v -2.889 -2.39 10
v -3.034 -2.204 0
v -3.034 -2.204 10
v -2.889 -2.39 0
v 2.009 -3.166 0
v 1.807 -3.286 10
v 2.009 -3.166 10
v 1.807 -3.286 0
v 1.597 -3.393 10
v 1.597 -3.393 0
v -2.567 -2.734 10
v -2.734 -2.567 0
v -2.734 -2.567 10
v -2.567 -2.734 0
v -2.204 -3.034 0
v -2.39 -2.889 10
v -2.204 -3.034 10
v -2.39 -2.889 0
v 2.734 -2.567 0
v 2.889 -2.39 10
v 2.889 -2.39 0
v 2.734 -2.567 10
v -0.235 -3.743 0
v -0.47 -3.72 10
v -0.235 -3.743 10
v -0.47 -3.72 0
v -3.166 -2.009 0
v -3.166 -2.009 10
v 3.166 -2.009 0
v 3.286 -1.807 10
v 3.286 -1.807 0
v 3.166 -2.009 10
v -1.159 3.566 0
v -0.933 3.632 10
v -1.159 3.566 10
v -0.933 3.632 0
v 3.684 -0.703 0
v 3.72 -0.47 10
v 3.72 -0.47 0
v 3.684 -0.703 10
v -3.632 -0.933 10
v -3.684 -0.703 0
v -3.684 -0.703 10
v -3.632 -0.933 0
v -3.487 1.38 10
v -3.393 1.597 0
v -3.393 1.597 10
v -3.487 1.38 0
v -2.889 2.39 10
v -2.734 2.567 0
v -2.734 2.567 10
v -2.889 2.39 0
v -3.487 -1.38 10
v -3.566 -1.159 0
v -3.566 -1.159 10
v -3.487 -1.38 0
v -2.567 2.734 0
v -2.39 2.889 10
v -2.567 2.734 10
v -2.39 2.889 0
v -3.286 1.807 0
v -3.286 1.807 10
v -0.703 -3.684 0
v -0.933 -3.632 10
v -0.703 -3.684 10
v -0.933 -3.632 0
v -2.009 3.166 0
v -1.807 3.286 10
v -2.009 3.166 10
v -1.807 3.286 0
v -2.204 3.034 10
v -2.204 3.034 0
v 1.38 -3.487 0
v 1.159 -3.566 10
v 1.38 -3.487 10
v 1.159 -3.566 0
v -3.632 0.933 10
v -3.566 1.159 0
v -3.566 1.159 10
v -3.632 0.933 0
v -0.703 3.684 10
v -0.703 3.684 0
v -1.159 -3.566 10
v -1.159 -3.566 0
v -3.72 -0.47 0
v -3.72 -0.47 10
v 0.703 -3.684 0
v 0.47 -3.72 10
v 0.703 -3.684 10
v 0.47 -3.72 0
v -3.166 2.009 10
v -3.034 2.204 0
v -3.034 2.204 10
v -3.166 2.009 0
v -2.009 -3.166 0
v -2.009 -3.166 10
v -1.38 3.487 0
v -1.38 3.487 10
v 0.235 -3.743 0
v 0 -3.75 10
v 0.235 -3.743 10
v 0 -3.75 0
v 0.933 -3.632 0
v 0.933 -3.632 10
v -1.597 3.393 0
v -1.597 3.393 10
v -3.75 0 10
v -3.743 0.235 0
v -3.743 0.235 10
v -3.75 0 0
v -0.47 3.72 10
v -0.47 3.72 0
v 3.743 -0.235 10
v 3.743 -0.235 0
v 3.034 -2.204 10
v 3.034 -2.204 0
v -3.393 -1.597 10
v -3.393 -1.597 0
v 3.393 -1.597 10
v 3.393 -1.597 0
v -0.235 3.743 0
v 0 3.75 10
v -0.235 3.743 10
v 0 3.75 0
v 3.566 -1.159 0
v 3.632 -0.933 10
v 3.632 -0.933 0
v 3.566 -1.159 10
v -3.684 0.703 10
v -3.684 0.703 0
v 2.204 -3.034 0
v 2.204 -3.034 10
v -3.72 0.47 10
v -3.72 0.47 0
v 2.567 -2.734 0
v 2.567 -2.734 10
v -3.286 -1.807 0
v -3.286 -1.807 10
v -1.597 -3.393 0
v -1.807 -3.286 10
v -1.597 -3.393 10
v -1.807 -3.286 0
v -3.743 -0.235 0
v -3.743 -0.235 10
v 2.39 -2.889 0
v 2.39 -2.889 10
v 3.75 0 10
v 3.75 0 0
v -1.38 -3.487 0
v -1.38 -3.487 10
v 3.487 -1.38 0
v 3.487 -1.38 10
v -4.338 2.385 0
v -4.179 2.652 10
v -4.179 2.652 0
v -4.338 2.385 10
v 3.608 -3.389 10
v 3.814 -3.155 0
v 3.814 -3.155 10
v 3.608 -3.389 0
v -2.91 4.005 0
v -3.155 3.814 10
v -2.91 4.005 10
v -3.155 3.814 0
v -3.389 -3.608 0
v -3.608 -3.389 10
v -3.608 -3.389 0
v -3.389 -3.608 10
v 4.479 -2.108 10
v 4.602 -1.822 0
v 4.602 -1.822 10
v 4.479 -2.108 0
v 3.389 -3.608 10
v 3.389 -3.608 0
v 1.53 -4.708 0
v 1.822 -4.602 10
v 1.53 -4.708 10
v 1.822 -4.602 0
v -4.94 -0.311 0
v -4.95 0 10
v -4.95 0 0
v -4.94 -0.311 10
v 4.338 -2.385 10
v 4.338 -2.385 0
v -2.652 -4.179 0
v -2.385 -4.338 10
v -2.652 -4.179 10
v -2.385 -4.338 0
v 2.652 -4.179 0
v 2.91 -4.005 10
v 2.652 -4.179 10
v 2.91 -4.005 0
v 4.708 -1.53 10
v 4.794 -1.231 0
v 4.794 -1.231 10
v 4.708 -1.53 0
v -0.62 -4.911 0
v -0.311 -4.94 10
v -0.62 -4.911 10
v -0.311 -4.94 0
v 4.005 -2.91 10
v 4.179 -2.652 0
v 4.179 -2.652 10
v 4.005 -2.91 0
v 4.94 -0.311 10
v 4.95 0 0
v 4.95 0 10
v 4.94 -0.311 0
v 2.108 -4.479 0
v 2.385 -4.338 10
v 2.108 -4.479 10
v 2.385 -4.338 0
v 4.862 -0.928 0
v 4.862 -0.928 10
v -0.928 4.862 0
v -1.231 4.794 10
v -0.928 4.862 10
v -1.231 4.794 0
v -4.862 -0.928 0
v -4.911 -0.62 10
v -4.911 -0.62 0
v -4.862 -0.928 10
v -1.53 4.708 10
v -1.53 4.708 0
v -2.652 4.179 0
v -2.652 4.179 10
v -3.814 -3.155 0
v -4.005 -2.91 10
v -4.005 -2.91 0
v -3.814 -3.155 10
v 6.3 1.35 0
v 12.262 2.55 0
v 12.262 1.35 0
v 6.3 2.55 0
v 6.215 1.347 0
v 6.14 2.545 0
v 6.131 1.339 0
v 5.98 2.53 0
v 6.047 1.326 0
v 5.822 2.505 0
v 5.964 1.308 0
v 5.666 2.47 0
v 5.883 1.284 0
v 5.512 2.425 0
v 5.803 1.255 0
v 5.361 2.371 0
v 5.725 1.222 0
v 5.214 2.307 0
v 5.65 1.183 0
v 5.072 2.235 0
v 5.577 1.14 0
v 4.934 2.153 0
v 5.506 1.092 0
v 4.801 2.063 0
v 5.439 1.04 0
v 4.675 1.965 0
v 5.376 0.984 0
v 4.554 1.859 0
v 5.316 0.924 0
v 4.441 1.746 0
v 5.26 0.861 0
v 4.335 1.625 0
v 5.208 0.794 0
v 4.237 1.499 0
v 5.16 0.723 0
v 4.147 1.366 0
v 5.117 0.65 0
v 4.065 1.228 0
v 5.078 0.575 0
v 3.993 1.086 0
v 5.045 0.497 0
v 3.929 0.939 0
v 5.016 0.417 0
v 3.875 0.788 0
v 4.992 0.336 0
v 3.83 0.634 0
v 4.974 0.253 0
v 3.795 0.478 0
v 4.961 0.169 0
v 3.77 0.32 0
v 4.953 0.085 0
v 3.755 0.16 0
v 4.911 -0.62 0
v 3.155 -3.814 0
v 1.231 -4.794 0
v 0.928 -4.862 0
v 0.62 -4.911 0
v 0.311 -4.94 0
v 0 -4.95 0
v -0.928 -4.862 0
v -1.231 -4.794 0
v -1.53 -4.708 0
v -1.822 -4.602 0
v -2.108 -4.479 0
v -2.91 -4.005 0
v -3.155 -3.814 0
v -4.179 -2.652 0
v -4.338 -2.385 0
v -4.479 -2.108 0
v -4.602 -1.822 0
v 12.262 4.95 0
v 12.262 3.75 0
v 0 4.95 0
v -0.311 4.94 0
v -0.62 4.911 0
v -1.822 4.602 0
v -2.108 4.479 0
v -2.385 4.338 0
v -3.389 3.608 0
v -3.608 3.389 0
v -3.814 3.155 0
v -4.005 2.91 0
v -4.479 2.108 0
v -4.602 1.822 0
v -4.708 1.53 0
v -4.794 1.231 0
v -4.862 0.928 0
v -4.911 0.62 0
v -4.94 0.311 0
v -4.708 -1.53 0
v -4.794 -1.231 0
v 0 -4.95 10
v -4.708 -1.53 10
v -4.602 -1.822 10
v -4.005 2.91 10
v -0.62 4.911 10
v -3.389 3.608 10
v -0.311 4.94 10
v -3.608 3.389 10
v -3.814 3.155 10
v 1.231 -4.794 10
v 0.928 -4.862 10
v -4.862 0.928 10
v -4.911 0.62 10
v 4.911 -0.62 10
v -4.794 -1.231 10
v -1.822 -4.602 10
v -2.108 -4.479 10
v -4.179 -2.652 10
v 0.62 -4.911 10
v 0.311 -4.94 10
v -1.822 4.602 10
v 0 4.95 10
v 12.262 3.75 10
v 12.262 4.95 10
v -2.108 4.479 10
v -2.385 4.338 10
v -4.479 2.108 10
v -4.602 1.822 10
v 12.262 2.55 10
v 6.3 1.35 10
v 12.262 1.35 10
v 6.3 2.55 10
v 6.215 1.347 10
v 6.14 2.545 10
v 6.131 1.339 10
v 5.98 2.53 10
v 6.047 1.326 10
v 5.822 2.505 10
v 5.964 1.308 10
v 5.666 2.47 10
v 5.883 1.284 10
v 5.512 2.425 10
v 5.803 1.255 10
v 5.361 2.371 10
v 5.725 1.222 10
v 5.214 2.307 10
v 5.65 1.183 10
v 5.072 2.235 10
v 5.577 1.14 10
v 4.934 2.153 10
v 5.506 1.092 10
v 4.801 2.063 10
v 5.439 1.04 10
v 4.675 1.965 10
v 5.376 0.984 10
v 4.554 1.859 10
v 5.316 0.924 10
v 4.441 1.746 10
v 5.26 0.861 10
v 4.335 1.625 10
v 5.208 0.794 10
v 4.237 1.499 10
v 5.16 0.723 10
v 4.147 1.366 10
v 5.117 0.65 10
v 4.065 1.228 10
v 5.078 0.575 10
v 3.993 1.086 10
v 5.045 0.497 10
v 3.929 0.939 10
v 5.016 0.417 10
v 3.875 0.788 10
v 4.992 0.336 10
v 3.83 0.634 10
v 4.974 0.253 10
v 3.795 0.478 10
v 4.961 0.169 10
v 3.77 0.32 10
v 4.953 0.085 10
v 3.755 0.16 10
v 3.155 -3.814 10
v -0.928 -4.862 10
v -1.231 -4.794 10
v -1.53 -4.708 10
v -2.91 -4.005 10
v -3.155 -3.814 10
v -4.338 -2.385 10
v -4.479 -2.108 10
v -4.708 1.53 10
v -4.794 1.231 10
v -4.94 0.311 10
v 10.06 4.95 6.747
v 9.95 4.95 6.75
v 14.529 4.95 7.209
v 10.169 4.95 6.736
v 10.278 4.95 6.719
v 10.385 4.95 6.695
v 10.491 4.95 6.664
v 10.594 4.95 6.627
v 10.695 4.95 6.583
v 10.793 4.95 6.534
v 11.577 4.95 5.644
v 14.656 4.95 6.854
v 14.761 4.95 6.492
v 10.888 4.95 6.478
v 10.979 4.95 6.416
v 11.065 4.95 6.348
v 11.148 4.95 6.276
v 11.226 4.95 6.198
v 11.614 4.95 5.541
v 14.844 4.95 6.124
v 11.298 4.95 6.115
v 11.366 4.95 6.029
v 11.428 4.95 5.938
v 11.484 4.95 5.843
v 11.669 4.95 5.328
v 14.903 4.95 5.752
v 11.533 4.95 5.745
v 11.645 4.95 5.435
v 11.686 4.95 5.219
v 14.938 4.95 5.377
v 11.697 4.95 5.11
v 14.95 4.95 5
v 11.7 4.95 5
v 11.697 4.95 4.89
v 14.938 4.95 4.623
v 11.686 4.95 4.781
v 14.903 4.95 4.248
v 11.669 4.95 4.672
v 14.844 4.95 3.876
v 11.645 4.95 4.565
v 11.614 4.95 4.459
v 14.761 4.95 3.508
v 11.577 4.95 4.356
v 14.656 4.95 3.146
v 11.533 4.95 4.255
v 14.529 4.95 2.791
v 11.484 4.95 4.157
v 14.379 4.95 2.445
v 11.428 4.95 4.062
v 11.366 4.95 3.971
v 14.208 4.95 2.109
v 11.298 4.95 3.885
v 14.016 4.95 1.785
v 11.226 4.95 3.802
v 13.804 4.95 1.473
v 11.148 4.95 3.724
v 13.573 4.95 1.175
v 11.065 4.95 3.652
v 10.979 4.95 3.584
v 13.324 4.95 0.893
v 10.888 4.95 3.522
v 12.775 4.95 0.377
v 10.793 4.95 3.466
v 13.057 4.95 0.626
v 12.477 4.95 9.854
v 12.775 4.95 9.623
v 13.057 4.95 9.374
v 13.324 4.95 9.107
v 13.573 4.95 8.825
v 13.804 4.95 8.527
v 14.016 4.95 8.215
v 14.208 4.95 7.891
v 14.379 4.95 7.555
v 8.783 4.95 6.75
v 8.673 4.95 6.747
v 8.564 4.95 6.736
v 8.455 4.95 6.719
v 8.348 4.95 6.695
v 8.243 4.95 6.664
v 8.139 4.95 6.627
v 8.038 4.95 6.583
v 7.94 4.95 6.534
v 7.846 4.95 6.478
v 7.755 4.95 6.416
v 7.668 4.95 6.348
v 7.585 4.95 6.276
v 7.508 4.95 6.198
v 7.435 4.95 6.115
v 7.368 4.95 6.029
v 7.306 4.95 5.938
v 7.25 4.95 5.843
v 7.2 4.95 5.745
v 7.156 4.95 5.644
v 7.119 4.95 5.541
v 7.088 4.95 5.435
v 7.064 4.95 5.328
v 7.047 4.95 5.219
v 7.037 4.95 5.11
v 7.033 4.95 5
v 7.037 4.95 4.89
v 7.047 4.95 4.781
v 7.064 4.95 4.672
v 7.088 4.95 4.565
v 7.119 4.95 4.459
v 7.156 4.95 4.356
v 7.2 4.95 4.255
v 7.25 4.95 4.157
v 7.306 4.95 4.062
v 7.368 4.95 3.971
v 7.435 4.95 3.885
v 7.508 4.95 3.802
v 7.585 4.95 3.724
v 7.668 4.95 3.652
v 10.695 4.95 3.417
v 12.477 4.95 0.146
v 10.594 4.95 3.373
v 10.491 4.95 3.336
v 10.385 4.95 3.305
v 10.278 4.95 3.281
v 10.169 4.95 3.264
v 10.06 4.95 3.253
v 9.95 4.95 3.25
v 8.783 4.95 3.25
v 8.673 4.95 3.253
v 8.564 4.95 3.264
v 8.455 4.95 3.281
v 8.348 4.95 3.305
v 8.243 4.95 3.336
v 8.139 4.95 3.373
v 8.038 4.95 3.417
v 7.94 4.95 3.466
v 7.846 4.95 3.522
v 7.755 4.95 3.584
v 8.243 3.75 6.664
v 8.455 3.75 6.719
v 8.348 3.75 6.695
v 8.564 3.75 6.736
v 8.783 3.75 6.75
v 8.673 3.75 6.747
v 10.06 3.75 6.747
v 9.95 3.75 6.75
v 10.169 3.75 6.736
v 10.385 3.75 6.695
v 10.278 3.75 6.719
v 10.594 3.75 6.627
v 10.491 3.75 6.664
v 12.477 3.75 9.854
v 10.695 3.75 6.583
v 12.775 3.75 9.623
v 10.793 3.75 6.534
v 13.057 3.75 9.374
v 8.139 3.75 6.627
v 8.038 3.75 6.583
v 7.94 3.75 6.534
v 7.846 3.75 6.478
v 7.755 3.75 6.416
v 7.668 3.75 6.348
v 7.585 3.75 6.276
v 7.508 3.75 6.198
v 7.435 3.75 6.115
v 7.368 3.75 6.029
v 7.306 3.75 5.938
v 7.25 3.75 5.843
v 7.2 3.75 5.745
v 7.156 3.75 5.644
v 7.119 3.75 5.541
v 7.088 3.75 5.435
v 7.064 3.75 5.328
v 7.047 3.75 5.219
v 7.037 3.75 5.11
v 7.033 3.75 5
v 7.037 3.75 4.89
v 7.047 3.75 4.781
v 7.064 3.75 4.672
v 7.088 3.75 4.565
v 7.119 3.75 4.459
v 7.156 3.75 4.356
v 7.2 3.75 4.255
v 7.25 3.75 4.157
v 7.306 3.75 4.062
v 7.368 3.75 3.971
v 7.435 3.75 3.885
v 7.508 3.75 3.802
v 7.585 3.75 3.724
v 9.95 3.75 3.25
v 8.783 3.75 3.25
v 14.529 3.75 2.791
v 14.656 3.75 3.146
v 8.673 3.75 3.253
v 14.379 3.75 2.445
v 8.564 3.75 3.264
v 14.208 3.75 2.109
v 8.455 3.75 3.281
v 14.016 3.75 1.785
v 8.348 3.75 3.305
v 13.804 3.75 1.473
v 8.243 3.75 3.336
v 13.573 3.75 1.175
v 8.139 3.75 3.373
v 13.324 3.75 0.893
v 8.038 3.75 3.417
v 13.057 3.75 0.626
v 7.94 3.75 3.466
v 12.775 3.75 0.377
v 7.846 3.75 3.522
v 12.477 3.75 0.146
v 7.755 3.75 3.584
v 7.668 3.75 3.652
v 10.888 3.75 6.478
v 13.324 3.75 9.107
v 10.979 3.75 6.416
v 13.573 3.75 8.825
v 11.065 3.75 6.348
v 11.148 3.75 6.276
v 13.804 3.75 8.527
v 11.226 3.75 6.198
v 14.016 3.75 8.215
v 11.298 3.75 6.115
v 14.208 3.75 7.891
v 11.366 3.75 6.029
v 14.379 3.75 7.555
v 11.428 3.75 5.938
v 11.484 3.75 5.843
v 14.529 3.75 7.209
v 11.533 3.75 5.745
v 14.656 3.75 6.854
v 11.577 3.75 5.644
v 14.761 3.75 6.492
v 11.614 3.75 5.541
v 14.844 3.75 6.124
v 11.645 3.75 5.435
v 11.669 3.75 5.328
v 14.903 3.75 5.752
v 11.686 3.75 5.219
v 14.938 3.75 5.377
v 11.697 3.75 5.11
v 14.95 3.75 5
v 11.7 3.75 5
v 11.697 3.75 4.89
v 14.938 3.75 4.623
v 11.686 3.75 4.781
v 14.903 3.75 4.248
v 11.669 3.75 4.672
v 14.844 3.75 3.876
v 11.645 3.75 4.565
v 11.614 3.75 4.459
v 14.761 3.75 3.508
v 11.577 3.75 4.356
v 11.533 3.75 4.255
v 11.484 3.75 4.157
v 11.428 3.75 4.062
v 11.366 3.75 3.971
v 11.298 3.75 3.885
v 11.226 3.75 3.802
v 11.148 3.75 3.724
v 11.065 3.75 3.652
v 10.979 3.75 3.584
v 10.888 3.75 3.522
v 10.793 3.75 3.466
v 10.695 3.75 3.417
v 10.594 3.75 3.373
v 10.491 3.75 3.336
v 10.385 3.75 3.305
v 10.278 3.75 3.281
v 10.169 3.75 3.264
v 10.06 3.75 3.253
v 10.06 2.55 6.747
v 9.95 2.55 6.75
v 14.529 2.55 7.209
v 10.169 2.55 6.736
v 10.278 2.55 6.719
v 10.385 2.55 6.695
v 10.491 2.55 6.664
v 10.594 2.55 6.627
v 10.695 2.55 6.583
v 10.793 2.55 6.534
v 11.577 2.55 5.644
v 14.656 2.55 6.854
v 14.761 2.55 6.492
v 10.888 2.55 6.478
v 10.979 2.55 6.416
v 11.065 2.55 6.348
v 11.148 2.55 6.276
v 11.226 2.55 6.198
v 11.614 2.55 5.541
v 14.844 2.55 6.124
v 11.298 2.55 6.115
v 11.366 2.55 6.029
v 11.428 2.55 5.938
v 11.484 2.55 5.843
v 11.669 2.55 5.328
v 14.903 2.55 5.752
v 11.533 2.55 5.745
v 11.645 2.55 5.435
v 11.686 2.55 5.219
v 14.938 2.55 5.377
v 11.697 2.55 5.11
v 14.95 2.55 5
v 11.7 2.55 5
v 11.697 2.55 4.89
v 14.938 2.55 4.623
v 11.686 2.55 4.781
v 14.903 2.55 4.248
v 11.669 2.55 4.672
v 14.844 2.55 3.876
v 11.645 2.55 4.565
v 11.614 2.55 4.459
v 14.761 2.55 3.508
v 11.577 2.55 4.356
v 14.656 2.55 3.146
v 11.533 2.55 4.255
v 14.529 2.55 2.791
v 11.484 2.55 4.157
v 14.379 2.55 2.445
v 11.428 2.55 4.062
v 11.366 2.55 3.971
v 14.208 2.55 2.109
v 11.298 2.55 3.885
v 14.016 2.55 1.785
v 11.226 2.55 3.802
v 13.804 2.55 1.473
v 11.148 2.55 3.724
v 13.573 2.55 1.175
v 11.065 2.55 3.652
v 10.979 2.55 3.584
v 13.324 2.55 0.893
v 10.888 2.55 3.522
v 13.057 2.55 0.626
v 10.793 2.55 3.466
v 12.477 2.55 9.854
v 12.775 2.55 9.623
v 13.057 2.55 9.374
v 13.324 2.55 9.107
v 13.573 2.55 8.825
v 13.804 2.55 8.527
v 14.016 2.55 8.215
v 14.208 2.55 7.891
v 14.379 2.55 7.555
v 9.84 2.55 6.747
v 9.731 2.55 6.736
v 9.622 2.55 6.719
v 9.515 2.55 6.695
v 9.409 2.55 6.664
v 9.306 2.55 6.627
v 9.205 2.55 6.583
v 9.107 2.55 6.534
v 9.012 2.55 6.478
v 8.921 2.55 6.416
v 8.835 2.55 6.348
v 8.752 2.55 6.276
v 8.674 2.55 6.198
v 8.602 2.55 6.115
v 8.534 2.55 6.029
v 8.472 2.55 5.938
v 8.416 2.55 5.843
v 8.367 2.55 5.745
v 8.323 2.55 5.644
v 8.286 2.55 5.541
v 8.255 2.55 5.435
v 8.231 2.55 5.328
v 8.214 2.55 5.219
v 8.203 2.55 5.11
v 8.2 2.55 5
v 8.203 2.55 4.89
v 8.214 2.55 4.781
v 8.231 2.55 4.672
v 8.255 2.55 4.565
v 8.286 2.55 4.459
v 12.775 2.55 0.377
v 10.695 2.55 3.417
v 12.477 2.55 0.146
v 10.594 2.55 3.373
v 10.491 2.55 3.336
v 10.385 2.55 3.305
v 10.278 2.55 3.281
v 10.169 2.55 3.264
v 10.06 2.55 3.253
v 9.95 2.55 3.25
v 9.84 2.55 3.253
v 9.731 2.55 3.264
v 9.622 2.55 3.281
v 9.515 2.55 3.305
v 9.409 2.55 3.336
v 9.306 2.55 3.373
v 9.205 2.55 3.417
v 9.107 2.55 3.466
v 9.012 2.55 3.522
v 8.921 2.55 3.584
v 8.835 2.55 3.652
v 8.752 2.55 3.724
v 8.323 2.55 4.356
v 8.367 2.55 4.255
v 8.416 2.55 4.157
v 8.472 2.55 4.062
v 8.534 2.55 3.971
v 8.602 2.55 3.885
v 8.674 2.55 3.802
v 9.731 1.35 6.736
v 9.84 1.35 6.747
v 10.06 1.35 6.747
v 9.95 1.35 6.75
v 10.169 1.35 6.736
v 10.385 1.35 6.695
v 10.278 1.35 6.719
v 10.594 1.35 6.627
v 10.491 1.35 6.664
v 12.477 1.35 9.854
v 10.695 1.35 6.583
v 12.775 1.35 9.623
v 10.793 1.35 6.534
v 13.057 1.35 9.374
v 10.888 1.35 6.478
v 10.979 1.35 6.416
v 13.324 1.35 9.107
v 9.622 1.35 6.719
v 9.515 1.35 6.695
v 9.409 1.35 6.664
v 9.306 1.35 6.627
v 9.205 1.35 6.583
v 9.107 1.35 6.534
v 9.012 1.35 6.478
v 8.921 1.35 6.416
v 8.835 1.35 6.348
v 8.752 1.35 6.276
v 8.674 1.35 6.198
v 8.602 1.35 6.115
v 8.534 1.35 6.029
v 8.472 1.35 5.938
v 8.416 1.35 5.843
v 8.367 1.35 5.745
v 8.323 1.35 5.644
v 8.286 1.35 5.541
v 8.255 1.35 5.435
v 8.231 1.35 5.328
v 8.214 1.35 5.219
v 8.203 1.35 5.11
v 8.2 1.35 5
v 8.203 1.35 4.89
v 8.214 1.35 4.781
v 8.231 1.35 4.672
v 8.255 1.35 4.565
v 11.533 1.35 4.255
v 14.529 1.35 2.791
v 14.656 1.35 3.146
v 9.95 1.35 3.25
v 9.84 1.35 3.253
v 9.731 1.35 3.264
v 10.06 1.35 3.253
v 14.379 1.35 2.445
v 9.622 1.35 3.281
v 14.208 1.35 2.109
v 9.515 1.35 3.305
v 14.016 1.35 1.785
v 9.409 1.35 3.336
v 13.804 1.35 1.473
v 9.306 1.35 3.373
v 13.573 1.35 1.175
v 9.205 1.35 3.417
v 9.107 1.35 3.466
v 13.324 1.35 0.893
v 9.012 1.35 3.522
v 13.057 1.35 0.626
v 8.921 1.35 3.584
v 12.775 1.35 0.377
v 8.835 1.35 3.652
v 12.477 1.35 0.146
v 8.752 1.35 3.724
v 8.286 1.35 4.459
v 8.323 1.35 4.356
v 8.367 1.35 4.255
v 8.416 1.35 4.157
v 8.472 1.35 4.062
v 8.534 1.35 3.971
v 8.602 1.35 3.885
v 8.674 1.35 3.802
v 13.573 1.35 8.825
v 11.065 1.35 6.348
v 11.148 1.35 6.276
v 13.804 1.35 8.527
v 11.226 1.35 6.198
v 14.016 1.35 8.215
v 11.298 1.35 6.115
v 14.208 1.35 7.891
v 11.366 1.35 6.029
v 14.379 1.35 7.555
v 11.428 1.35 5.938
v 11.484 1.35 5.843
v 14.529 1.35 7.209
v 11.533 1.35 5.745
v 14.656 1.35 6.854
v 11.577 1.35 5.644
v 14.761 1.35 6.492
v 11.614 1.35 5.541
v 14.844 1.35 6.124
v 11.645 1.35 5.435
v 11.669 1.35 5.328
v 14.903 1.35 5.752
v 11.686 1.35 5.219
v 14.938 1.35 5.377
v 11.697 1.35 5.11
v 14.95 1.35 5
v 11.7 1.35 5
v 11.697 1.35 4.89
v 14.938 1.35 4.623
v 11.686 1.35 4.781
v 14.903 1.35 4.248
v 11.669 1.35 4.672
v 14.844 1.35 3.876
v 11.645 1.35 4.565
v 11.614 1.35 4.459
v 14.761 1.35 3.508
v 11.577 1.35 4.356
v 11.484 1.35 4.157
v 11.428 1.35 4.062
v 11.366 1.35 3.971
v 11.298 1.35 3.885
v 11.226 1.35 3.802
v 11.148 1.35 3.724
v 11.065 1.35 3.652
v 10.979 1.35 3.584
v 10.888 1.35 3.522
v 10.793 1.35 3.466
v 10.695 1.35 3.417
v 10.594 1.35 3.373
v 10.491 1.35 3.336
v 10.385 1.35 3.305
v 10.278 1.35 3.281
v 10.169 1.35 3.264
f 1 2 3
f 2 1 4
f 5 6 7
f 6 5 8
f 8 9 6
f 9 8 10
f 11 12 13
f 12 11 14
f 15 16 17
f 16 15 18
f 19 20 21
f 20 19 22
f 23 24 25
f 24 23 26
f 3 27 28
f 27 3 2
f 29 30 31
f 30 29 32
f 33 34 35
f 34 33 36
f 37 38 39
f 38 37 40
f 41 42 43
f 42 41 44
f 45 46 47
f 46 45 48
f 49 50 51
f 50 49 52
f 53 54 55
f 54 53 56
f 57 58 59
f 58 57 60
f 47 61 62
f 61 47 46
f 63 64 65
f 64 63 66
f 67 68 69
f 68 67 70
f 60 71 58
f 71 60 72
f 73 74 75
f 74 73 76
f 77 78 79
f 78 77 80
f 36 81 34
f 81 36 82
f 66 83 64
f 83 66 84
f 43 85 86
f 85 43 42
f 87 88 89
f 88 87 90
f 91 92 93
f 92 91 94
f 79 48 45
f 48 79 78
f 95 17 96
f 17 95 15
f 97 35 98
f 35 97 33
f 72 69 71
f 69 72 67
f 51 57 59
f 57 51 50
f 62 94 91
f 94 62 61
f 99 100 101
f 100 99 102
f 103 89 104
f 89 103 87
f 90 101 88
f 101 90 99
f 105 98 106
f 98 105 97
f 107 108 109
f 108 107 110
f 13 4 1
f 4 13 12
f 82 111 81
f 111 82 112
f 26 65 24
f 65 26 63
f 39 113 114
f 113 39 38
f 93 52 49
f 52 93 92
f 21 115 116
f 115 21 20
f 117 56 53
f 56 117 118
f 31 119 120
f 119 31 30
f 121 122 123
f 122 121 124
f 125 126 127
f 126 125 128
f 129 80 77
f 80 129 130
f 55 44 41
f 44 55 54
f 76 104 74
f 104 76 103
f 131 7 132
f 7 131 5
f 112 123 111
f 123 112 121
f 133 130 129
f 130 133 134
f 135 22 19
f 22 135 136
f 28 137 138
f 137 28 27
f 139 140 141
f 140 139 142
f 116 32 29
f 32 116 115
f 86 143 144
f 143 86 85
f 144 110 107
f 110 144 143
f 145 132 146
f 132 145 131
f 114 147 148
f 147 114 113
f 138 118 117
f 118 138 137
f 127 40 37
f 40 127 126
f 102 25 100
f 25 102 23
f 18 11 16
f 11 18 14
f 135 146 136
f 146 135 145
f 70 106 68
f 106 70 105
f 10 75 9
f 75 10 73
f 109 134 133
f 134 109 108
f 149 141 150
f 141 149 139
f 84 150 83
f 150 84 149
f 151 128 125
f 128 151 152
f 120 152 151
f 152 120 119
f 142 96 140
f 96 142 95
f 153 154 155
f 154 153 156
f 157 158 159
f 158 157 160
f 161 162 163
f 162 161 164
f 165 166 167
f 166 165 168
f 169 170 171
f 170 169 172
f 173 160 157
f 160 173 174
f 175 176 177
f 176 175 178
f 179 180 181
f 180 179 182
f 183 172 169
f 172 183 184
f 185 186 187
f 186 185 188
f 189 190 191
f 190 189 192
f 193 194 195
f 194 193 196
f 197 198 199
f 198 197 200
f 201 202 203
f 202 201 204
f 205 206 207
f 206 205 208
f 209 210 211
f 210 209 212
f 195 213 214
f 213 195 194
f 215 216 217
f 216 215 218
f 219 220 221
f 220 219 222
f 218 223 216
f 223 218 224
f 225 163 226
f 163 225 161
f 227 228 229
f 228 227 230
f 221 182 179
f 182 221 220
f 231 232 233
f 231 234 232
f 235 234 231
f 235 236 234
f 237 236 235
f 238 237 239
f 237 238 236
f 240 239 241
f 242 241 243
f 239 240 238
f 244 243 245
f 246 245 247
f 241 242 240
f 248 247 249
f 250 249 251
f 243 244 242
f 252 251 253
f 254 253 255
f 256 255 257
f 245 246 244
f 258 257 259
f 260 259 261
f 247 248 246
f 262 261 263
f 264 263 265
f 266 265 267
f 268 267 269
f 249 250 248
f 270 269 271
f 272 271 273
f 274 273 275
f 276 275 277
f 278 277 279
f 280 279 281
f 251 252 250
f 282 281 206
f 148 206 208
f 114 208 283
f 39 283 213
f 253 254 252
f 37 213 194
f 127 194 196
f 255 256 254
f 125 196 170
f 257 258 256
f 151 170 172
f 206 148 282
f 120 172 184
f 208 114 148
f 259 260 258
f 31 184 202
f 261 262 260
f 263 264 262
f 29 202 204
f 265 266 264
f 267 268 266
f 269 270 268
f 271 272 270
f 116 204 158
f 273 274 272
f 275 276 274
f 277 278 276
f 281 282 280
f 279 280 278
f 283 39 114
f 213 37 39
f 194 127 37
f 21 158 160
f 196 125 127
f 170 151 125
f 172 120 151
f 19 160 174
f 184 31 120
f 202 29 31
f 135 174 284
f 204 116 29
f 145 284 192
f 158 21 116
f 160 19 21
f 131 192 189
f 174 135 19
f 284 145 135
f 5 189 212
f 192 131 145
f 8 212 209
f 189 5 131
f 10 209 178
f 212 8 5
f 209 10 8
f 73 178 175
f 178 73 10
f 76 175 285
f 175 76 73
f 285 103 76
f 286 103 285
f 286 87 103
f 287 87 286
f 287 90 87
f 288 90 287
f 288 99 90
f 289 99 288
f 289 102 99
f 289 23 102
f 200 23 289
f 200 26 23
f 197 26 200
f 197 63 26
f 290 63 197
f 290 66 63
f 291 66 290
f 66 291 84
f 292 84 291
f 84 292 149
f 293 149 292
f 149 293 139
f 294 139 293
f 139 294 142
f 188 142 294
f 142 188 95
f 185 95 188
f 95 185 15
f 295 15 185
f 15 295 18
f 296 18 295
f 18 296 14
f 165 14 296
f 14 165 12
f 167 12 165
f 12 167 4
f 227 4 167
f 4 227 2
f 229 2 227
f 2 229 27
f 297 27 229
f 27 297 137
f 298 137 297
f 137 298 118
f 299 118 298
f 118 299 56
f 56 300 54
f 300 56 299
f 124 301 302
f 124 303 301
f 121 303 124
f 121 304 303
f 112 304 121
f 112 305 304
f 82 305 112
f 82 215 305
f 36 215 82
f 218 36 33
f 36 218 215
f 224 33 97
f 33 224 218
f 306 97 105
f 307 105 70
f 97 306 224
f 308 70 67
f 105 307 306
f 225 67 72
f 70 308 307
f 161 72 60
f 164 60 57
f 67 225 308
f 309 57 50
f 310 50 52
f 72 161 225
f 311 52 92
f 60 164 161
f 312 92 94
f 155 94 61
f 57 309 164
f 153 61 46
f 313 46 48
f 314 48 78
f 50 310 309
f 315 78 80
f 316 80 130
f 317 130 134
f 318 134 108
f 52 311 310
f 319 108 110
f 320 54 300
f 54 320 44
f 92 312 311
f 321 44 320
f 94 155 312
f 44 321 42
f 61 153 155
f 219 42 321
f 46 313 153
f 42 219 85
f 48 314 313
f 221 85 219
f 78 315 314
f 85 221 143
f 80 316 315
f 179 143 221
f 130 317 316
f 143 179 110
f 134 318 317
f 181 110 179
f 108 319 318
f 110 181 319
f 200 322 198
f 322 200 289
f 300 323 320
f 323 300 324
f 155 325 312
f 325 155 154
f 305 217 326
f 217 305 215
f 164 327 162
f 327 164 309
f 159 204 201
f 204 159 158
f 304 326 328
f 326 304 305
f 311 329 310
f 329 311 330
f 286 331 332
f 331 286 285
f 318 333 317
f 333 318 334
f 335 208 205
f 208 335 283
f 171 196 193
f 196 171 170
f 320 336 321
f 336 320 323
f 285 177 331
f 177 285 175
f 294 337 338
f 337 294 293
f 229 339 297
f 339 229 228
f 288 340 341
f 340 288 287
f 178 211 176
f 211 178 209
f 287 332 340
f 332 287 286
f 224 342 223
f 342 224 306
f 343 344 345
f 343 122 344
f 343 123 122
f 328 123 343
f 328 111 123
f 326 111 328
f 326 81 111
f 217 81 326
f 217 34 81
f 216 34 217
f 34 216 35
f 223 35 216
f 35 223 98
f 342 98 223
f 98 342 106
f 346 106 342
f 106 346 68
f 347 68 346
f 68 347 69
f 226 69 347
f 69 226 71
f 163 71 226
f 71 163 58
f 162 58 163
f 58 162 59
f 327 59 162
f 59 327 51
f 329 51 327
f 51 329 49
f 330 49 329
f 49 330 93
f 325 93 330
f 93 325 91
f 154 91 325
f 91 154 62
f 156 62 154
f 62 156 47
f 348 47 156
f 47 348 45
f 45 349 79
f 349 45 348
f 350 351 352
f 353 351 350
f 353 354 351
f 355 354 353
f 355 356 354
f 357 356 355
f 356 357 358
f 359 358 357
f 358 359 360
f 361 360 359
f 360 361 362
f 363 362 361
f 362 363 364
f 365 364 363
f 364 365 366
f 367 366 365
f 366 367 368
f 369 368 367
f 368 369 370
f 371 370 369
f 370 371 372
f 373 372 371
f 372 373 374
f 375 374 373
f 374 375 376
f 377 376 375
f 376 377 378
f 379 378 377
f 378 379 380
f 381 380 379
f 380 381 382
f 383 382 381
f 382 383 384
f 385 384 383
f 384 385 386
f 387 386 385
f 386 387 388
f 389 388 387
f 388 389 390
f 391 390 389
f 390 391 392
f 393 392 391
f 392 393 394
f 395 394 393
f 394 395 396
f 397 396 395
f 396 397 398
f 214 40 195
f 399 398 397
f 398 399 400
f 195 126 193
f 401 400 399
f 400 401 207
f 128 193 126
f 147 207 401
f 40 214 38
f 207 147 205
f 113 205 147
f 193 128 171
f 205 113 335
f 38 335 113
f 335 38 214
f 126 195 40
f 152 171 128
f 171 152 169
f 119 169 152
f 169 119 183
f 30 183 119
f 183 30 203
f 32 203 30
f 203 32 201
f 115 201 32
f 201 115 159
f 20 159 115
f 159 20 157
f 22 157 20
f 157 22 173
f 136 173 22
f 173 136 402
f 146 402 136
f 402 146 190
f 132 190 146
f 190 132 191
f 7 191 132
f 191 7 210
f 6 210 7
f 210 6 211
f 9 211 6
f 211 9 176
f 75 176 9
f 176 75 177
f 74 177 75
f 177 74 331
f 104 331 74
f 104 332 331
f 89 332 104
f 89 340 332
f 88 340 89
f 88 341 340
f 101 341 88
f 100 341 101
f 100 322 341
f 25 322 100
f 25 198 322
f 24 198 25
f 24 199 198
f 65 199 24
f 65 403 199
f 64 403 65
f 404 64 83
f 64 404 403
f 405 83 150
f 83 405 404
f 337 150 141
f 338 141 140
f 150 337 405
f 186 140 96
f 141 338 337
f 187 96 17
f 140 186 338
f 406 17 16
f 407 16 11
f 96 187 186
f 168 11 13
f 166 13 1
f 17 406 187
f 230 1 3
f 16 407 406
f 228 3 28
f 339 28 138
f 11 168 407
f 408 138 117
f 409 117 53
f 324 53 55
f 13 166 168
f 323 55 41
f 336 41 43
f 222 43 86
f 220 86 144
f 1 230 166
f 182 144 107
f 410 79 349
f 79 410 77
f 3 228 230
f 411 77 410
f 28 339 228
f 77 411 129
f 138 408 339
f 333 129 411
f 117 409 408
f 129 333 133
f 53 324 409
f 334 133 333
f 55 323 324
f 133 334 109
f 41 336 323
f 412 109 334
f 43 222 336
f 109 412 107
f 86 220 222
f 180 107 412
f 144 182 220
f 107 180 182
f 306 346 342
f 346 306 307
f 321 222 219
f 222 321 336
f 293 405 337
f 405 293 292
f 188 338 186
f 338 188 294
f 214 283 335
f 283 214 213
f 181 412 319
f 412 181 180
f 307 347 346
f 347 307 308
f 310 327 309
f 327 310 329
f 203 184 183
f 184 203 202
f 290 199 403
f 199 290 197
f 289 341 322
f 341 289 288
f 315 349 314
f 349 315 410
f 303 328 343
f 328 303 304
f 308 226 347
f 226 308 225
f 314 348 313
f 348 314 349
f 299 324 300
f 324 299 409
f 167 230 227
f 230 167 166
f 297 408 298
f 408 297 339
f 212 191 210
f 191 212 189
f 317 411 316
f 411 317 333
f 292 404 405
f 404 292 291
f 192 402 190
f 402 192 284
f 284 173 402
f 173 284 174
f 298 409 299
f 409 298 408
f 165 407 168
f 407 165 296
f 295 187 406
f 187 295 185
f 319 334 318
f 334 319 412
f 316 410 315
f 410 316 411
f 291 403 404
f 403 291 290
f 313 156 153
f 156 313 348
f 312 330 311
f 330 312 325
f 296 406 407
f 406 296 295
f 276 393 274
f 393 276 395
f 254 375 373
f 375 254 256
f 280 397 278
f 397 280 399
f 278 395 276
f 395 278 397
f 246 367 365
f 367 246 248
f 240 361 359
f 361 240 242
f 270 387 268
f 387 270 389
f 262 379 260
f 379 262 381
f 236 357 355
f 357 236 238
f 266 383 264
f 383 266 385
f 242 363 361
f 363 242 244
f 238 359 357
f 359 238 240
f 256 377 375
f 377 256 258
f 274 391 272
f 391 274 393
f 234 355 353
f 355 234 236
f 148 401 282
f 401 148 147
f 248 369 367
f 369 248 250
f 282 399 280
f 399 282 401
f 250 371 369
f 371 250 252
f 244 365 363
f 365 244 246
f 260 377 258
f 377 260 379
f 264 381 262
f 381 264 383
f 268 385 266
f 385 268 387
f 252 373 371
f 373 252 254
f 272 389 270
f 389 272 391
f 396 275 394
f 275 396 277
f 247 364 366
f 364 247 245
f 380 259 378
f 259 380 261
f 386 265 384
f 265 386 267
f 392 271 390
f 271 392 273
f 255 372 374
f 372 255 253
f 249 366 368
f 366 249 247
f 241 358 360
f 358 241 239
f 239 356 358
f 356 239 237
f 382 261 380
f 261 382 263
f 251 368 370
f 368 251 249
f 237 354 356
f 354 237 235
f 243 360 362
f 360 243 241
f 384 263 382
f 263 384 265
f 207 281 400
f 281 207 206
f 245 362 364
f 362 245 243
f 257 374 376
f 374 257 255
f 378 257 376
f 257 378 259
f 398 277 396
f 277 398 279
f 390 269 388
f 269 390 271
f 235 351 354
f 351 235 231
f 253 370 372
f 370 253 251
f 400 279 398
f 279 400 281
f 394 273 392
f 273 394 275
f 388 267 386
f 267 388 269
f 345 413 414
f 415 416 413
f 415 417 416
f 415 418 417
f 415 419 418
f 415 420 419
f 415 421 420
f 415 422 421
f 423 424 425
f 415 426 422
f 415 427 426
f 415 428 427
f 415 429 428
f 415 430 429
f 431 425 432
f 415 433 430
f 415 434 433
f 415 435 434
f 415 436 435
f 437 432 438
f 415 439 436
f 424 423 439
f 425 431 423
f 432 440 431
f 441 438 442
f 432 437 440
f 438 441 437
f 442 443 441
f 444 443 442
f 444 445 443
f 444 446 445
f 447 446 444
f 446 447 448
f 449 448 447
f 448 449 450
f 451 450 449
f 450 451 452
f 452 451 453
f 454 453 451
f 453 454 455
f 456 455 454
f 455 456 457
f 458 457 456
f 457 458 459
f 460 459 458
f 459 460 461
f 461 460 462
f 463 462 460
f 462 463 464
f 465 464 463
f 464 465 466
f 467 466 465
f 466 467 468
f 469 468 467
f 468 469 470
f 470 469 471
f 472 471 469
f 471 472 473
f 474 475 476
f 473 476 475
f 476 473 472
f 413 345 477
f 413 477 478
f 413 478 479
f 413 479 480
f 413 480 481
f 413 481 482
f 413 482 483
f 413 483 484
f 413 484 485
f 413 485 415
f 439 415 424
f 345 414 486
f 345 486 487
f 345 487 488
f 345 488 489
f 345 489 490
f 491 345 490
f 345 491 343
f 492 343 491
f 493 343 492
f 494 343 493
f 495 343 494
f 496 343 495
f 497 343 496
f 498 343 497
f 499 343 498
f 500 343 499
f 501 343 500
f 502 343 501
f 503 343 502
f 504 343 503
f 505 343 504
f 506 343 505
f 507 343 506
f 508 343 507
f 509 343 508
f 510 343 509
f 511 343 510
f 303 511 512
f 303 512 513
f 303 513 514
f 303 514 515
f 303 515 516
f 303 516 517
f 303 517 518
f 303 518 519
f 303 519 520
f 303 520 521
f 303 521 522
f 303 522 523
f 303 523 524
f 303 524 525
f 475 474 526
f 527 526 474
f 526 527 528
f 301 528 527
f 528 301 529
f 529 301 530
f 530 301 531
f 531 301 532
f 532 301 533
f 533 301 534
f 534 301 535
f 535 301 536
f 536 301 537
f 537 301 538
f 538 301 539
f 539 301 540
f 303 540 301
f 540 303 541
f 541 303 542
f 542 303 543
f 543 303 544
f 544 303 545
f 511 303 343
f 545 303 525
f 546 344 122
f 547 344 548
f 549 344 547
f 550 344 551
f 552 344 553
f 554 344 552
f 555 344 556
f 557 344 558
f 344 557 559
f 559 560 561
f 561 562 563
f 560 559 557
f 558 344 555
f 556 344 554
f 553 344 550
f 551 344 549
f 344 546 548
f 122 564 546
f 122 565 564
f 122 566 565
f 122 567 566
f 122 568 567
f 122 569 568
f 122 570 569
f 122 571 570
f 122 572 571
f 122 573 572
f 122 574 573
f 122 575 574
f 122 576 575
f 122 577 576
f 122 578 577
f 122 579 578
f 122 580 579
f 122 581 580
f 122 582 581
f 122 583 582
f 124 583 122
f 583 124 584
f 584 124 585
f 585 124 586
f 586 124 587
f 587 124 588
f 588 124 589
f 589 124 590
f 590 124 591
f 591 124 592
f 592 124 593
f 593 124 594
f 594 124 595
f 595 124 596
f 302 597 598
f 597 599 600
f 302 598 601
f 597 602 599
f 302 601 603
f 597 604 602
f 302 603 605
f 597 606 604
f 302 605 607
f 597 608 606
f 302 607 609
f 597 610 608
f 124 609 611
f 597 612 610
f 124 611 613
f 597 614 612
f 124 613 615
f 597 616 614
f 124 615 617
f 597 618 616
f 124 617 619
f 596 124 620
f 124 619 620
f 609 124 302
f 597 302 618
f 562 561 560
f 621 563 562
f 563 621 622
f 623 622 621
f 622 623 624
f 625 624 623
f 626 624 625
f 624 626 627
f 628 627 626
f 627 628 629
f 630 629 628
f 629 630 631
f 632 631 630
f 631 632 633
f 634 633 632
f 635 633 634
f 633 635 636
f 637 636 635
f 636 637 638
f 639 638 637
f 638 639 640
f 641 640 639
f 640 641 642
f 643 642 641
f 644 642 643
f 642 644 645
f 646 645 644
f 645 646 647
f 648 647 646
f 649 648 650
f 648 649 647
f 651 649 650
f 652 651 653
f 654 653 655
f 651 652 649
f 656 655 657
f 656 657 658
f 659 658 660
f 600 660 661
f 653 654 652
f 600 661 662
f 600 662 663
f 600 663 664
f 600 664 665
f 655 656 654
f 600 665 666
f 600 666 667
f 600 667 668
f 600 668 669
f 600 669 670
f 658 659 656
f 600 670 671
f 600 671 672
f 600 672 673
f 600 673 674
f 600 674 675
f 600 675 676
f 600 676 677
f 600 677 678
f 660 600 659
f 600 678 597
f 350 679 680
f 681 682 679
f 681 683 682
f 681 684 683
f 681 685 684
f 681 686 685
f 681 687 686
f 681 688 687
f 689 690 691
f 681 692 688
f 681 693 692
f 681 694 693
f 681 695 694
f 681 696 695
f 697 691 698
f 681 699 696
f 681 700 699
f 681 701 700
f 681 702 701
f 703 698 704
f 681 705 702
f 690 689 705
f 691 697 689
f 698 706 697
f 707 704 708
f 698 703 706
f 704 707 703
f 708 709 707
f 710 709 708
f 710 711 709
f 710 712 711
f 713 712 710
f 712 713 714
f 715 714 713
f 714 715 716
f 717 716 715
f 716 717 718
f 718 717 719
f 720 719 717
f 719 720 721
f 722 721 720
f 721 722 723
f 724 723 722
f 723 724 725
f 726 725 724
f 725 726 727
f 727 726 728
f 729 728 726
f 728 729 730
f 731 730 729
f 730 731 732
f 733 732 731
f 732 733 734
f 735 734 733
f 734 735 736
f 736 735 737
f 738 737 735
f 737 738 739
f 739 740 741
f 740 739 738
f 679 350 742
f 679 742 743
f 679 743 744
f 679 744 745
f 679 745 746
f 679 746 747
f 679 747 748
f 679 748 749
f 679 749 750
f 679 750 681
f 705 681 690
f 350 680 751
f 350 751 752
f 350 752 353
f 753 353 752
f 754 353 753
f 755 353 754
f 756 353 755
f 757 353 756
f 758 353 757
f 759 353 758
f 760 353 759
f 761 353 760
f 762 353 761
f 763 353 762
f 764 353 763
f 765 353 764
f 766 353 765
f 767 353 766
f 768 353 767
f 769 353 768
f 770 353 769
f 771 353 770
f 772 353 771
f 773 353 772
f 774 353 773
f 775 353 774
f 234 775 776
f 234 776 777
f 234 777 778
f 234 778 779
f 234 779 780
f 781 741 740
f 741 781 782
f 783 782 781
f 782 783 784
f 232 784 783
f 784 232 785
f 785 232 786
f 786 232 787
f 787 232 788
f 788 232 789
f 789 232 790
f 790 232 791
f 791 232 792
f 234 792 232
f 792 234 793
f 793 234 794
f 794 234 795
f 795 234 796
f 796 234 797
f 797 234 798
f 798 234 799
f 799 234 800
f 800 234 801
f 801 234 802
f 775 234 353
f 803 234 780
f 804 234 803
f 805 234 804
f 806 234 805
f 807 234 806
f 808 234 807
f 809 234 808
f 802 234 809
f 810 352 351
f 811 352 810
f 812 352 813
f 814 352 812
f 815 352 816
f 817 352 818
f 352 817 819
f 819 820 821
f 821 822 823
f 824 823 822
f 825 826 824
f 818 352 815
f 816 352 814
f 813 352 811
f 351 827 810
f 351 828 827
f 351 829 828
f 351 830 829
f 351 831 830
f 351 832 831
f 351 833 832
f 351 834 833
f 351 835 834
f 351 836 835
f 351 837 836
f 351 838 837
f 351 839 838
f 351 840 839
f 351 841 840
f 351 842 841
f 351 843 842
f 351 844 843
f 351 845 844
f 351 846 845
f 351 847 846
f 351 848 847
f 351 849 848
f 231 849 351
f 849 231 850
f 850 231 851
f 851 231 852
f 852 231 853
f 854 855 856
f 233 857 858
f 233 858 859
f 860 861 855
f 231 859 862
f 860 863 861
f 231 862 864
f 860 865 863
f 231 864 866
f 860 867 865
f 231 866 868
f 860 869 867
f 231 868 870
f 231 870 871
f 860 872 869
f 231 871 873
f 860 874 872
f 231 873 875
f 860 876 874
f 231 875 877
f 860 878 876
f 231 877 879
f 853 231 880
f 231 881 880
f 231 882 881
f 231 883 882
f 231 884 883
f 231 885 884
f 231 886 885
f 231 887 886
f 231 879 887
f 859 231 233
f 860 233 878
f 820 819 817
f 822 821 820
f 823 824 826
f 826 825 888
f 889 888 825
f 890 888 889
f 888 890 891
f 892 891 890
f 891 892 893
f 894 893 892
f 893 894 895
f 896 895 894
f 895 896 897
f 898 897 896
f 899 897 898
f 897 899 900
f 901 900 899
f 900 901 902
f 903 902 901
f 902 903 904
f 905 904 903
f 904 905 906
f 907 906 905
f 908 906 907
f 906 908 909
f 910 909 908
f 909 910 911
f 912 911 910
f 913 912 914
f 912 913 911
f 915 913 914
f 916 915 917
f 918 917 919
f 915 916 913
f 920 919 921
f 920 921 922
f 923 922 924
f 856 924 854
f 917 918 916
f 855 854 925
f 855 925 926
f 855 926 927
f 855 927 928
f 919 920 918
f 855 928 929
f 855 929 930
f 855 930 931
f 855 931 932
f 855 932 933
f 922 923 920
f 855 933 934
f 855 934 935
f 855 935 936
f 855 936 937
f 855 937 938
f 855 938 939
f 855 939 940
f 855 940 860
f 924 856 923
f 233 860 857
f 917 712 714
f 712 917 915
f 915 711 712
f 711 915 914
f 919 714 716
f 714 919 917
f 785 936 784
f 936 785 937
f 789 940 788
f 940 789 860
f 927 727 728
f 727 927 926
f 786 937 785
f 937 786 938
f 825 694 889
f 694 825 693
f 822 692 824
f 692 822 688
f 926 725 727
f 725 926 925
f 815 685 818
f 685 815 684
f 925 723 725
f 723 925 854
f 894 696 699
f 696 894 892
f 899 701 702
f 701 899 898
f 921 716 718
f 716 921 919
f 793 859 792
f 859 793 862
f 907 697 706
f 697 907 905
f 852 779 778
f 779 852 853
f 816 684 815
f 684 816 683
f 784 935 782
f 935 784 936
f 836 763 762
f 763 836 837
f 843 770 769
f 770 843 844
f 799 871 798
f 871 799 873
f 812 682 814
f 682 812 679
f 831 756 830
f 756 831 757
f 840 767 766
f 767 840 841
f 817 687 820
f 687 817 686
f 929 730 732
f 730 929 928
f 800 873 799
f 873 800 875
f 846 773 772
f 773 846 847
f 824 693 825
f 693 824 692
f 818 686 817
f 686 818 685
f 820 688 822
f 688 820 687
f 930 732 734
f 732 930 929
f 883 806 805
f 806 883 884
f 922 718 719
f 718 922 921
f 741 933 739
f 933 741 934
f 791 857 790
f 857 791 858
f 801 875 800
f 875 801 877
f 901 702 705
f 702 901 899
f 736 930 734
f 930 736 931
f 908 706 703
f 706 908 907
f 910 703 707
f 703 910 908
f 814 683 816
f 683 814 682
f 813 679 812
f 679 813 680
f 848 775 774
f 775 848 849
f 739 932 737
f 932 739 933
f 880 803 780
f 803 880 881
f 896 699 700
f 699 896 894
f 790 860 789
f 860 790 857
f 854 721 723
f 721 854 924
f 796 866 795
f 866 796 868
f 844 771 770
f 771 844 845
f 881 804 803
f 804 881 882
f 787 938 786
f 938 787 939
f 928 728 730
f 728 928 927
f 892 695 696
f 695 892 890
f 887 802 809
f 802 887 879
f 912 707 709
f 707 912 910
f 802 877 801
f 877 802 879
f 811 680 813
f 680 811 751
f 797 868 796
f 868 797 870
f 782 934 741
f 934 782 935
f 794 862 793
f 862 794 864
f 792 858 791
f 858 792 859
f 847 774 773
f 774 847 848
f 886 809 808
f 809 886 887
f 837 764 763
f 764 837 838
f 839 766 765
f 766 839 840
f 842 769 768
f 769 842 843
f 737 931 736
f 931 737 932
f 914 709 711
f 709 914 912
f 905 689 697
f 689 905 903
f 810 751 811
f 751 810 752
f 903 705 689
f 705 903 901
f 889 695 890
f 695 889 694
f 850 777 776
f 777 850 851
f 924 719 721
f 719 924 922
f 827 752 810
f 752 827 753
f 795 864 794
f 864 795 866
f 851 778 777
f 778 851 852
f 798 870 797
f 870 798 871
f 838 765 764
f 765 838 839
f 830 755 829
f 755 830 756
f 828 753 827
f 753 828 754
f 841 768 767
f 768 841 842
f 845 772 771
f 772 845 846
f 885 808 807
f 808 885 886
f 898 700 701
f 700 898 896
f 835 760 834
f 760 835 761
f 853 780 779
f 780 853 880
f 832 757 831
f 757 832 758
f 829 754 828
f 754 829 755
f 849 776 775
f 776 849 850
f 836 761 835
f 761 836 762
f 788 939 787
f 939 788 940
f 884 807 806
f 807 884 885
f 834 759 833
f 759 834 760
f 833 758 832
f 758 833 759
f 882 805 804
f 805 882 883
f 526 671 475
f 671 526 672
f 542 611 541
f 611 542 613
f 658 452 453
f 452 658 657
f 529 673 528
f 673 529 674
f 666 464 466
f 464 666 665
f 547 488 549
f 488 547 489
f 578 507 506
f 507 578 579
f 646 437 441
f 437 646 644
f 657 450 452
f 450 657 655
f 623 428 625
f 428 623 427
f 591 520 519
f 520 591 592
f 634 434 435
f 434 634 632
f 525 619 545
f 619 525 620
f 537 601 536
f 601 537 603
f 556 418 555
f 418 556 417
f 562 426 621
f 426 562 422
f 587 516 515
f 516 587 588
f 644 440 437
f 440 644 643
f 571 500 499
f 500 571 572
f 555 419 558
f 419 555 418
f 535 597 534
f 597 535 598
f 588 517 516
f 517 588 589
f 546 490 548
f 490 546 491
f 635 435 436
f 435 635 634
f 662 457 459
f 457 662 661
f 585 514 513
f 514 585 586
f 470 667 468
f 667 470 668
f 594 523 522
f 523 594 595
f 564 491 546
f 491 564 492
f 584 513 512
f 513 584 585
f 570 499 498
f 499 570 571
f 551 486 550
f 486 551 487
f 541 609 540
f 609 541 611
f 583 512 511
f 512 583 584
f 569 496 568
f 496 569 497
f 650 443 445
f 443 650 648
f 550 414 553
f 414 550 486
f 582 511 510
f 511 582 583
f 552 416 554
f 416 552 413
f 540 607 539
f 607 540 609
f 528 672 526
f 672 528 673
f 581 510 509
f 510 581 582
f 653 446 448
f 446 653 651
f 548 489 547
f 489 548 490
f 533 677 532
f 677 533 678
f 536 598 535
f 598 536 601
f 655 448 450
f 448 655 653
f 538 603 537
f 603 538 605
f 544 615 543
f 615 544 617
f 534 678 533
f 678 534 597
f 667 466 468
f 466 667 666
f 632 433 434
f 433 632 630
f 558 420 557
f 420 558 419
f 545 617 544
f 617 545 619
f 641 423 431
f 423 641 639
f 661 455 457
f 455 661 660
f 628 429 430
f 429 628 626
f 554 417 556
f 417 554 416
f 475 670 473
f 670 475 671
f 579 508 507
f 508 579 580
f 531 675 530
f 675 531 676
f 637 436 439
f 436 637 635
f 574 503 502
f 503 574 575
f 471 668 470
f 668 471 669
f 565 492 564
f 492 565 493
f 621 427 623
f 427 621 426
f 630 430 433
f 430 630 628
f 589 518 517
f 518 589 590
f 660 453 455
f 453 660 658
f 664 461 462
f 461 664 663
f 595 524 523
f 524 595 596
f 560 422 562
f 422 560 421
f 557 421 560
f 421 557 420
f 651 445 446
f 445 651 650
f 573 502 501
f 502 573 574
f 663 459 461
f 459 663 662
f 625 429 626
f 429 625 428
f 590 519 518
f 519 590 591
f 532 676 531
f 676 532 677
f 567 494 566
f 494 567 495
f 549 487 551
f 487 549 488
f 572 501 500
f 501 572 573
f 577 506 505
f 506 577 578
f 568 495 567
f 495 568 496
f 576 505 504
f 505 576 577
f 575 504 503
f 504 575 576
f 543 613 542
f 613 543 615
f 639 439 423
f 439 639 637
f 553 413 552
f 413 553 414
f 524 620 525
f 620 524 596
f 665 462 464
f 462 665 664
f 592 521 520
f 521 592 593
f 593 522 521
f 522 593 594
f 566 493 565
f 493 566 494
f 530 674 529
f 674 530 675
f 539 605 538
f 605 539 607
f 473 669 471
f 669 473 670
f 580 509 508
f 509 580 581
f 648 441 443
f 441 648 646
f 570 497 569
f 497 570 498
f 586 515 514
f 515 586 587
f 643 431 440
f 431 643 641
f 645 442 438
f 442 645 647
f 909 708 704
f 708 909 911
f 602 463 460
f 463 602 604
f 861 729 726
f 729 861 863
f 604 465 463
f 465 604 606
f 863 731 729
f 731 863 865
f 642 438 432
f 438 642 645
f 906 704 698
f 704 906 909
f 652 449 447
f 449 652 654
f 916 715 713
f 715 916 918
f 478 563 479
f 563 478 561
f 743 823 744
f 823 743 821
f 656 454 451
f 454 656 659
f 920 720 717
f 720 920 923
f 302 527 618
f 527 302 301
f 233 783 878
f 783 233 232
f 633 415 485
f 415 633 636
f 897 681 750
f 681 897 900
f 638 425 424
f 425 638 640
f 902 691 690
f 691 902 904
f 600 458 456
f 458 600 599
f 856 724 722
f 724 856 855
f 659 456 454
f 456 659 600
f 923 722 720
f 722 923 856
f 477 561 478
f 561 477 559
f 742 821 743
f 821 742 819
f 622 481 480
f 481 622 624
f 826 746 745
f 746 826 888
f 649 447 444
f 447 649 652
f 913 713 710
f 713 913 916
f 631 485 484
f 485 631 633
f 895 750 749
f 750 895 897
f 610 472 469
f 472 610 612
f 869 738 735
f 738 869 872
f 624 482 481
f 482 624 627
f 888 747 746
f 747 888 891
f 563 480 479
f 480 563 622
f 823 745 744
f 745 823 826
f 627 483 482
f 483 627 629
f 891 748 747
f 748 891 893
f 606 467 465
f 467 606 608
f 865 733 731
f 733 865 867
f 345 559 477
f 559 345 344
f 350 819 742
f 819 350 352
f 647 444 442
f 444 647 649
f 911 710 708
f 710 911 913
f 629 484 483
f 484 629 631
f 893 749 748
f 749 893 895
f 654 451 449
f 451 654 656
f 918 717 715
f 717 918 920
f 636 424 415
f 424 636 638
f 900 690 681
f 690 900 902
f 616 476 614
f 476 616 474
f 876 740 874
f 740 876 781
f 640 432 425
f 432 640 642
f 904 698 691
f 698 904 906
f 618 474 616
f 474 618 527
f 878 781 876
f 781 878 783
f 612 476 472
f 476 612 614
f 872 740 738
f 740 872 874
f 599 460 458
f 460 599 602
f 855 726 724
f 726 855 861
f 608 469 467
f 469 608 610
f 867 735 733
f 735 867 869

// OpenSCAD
/* 
Wire clamp
*/

$fn=100;

// config params:
NZ_D=0.4;				// nozzle dia
NZ_H=0.25;				// nozzle height
// build switches:
RAD=1;					// enable end radius
BIG=1;					// big/small
//  params:
T=NZ_D*3;				// thickness
D=(BIG)?7.5:6;			// wires ID
H=10;						// height
HOLE_D=3.5;				// screw hole dia
// derived params:
GAP=T;					// gap
IR=D/2;					// wire IR
OR=IR+T;					// wire OR
OR2=IR-GAP;				// blend OR
IR2=OR2-T;				// blend IR
L=OR+H;					// bottom flat length
R=H*0.6;					// end radius
HOLE_E=HOLE_D/3;		// bottom screw hole elongation


module outer(){
	difference(){
		cylinder(r=OR, h=H);  // OR
		translate([0,0,-0.01]){
			cylinder(r=IR, h=H+0.02);  // IR
			cube([OR, OR, H+0.02]);  // quad cut
		}
	}
	translate([OR+IR2,0,0]){
		intersection(){
			difference(){
				cylinder(r=OR2, h=H);  // OR2
				translate([0,0,-0.01]) cylinder(r=IR2, h=H+0.02);  // IR2
			}
			rotate([0,0,90]) cube([OR, OR, H+0.02]); // quad retain
		}
	}
	translate([0,IR,0]) cube([L,T,H]);  // bottom flat
	translate([OR+IR2,IR2,0]) cube([L-OR-IR2,T,H]);  // top flat
}


module holes(){
	translate([L-H/2,IR2-0.01,H/2]) rotate([-90,0,0]) cylinder(d=HOLE_D, h=T+0.02);  // top hole
	translate([L-H/2,IR-0.01,H/2]) rotate([-90,0,0]){
		hull(){
			cylinder(d=HOLE_D, h=T+0.02);
			translate([-HOLE_E,0,0]) cylinder(d=HOLE_D, h=T+0.02);
		}
	}
}


module end_radius(){
	translate([0,0,H/2]) rotate([-90,0,0]){
		hull(){
			translate([L-R,0,0]) cylinder(r=R, h=OR*2, center=true);
			translate([-L+R,0,0]) cylinder(r=R, h=OR*2, center=true);
		}
	}
}

module w_no_radius(){
	difference(){
		outer();
		holes();
	}
}

module w_radius(){
	intersection(){
		w_no_radius();
		end_radius();
	}
}

if (RAD) w_radius();
else w_no_radius();
